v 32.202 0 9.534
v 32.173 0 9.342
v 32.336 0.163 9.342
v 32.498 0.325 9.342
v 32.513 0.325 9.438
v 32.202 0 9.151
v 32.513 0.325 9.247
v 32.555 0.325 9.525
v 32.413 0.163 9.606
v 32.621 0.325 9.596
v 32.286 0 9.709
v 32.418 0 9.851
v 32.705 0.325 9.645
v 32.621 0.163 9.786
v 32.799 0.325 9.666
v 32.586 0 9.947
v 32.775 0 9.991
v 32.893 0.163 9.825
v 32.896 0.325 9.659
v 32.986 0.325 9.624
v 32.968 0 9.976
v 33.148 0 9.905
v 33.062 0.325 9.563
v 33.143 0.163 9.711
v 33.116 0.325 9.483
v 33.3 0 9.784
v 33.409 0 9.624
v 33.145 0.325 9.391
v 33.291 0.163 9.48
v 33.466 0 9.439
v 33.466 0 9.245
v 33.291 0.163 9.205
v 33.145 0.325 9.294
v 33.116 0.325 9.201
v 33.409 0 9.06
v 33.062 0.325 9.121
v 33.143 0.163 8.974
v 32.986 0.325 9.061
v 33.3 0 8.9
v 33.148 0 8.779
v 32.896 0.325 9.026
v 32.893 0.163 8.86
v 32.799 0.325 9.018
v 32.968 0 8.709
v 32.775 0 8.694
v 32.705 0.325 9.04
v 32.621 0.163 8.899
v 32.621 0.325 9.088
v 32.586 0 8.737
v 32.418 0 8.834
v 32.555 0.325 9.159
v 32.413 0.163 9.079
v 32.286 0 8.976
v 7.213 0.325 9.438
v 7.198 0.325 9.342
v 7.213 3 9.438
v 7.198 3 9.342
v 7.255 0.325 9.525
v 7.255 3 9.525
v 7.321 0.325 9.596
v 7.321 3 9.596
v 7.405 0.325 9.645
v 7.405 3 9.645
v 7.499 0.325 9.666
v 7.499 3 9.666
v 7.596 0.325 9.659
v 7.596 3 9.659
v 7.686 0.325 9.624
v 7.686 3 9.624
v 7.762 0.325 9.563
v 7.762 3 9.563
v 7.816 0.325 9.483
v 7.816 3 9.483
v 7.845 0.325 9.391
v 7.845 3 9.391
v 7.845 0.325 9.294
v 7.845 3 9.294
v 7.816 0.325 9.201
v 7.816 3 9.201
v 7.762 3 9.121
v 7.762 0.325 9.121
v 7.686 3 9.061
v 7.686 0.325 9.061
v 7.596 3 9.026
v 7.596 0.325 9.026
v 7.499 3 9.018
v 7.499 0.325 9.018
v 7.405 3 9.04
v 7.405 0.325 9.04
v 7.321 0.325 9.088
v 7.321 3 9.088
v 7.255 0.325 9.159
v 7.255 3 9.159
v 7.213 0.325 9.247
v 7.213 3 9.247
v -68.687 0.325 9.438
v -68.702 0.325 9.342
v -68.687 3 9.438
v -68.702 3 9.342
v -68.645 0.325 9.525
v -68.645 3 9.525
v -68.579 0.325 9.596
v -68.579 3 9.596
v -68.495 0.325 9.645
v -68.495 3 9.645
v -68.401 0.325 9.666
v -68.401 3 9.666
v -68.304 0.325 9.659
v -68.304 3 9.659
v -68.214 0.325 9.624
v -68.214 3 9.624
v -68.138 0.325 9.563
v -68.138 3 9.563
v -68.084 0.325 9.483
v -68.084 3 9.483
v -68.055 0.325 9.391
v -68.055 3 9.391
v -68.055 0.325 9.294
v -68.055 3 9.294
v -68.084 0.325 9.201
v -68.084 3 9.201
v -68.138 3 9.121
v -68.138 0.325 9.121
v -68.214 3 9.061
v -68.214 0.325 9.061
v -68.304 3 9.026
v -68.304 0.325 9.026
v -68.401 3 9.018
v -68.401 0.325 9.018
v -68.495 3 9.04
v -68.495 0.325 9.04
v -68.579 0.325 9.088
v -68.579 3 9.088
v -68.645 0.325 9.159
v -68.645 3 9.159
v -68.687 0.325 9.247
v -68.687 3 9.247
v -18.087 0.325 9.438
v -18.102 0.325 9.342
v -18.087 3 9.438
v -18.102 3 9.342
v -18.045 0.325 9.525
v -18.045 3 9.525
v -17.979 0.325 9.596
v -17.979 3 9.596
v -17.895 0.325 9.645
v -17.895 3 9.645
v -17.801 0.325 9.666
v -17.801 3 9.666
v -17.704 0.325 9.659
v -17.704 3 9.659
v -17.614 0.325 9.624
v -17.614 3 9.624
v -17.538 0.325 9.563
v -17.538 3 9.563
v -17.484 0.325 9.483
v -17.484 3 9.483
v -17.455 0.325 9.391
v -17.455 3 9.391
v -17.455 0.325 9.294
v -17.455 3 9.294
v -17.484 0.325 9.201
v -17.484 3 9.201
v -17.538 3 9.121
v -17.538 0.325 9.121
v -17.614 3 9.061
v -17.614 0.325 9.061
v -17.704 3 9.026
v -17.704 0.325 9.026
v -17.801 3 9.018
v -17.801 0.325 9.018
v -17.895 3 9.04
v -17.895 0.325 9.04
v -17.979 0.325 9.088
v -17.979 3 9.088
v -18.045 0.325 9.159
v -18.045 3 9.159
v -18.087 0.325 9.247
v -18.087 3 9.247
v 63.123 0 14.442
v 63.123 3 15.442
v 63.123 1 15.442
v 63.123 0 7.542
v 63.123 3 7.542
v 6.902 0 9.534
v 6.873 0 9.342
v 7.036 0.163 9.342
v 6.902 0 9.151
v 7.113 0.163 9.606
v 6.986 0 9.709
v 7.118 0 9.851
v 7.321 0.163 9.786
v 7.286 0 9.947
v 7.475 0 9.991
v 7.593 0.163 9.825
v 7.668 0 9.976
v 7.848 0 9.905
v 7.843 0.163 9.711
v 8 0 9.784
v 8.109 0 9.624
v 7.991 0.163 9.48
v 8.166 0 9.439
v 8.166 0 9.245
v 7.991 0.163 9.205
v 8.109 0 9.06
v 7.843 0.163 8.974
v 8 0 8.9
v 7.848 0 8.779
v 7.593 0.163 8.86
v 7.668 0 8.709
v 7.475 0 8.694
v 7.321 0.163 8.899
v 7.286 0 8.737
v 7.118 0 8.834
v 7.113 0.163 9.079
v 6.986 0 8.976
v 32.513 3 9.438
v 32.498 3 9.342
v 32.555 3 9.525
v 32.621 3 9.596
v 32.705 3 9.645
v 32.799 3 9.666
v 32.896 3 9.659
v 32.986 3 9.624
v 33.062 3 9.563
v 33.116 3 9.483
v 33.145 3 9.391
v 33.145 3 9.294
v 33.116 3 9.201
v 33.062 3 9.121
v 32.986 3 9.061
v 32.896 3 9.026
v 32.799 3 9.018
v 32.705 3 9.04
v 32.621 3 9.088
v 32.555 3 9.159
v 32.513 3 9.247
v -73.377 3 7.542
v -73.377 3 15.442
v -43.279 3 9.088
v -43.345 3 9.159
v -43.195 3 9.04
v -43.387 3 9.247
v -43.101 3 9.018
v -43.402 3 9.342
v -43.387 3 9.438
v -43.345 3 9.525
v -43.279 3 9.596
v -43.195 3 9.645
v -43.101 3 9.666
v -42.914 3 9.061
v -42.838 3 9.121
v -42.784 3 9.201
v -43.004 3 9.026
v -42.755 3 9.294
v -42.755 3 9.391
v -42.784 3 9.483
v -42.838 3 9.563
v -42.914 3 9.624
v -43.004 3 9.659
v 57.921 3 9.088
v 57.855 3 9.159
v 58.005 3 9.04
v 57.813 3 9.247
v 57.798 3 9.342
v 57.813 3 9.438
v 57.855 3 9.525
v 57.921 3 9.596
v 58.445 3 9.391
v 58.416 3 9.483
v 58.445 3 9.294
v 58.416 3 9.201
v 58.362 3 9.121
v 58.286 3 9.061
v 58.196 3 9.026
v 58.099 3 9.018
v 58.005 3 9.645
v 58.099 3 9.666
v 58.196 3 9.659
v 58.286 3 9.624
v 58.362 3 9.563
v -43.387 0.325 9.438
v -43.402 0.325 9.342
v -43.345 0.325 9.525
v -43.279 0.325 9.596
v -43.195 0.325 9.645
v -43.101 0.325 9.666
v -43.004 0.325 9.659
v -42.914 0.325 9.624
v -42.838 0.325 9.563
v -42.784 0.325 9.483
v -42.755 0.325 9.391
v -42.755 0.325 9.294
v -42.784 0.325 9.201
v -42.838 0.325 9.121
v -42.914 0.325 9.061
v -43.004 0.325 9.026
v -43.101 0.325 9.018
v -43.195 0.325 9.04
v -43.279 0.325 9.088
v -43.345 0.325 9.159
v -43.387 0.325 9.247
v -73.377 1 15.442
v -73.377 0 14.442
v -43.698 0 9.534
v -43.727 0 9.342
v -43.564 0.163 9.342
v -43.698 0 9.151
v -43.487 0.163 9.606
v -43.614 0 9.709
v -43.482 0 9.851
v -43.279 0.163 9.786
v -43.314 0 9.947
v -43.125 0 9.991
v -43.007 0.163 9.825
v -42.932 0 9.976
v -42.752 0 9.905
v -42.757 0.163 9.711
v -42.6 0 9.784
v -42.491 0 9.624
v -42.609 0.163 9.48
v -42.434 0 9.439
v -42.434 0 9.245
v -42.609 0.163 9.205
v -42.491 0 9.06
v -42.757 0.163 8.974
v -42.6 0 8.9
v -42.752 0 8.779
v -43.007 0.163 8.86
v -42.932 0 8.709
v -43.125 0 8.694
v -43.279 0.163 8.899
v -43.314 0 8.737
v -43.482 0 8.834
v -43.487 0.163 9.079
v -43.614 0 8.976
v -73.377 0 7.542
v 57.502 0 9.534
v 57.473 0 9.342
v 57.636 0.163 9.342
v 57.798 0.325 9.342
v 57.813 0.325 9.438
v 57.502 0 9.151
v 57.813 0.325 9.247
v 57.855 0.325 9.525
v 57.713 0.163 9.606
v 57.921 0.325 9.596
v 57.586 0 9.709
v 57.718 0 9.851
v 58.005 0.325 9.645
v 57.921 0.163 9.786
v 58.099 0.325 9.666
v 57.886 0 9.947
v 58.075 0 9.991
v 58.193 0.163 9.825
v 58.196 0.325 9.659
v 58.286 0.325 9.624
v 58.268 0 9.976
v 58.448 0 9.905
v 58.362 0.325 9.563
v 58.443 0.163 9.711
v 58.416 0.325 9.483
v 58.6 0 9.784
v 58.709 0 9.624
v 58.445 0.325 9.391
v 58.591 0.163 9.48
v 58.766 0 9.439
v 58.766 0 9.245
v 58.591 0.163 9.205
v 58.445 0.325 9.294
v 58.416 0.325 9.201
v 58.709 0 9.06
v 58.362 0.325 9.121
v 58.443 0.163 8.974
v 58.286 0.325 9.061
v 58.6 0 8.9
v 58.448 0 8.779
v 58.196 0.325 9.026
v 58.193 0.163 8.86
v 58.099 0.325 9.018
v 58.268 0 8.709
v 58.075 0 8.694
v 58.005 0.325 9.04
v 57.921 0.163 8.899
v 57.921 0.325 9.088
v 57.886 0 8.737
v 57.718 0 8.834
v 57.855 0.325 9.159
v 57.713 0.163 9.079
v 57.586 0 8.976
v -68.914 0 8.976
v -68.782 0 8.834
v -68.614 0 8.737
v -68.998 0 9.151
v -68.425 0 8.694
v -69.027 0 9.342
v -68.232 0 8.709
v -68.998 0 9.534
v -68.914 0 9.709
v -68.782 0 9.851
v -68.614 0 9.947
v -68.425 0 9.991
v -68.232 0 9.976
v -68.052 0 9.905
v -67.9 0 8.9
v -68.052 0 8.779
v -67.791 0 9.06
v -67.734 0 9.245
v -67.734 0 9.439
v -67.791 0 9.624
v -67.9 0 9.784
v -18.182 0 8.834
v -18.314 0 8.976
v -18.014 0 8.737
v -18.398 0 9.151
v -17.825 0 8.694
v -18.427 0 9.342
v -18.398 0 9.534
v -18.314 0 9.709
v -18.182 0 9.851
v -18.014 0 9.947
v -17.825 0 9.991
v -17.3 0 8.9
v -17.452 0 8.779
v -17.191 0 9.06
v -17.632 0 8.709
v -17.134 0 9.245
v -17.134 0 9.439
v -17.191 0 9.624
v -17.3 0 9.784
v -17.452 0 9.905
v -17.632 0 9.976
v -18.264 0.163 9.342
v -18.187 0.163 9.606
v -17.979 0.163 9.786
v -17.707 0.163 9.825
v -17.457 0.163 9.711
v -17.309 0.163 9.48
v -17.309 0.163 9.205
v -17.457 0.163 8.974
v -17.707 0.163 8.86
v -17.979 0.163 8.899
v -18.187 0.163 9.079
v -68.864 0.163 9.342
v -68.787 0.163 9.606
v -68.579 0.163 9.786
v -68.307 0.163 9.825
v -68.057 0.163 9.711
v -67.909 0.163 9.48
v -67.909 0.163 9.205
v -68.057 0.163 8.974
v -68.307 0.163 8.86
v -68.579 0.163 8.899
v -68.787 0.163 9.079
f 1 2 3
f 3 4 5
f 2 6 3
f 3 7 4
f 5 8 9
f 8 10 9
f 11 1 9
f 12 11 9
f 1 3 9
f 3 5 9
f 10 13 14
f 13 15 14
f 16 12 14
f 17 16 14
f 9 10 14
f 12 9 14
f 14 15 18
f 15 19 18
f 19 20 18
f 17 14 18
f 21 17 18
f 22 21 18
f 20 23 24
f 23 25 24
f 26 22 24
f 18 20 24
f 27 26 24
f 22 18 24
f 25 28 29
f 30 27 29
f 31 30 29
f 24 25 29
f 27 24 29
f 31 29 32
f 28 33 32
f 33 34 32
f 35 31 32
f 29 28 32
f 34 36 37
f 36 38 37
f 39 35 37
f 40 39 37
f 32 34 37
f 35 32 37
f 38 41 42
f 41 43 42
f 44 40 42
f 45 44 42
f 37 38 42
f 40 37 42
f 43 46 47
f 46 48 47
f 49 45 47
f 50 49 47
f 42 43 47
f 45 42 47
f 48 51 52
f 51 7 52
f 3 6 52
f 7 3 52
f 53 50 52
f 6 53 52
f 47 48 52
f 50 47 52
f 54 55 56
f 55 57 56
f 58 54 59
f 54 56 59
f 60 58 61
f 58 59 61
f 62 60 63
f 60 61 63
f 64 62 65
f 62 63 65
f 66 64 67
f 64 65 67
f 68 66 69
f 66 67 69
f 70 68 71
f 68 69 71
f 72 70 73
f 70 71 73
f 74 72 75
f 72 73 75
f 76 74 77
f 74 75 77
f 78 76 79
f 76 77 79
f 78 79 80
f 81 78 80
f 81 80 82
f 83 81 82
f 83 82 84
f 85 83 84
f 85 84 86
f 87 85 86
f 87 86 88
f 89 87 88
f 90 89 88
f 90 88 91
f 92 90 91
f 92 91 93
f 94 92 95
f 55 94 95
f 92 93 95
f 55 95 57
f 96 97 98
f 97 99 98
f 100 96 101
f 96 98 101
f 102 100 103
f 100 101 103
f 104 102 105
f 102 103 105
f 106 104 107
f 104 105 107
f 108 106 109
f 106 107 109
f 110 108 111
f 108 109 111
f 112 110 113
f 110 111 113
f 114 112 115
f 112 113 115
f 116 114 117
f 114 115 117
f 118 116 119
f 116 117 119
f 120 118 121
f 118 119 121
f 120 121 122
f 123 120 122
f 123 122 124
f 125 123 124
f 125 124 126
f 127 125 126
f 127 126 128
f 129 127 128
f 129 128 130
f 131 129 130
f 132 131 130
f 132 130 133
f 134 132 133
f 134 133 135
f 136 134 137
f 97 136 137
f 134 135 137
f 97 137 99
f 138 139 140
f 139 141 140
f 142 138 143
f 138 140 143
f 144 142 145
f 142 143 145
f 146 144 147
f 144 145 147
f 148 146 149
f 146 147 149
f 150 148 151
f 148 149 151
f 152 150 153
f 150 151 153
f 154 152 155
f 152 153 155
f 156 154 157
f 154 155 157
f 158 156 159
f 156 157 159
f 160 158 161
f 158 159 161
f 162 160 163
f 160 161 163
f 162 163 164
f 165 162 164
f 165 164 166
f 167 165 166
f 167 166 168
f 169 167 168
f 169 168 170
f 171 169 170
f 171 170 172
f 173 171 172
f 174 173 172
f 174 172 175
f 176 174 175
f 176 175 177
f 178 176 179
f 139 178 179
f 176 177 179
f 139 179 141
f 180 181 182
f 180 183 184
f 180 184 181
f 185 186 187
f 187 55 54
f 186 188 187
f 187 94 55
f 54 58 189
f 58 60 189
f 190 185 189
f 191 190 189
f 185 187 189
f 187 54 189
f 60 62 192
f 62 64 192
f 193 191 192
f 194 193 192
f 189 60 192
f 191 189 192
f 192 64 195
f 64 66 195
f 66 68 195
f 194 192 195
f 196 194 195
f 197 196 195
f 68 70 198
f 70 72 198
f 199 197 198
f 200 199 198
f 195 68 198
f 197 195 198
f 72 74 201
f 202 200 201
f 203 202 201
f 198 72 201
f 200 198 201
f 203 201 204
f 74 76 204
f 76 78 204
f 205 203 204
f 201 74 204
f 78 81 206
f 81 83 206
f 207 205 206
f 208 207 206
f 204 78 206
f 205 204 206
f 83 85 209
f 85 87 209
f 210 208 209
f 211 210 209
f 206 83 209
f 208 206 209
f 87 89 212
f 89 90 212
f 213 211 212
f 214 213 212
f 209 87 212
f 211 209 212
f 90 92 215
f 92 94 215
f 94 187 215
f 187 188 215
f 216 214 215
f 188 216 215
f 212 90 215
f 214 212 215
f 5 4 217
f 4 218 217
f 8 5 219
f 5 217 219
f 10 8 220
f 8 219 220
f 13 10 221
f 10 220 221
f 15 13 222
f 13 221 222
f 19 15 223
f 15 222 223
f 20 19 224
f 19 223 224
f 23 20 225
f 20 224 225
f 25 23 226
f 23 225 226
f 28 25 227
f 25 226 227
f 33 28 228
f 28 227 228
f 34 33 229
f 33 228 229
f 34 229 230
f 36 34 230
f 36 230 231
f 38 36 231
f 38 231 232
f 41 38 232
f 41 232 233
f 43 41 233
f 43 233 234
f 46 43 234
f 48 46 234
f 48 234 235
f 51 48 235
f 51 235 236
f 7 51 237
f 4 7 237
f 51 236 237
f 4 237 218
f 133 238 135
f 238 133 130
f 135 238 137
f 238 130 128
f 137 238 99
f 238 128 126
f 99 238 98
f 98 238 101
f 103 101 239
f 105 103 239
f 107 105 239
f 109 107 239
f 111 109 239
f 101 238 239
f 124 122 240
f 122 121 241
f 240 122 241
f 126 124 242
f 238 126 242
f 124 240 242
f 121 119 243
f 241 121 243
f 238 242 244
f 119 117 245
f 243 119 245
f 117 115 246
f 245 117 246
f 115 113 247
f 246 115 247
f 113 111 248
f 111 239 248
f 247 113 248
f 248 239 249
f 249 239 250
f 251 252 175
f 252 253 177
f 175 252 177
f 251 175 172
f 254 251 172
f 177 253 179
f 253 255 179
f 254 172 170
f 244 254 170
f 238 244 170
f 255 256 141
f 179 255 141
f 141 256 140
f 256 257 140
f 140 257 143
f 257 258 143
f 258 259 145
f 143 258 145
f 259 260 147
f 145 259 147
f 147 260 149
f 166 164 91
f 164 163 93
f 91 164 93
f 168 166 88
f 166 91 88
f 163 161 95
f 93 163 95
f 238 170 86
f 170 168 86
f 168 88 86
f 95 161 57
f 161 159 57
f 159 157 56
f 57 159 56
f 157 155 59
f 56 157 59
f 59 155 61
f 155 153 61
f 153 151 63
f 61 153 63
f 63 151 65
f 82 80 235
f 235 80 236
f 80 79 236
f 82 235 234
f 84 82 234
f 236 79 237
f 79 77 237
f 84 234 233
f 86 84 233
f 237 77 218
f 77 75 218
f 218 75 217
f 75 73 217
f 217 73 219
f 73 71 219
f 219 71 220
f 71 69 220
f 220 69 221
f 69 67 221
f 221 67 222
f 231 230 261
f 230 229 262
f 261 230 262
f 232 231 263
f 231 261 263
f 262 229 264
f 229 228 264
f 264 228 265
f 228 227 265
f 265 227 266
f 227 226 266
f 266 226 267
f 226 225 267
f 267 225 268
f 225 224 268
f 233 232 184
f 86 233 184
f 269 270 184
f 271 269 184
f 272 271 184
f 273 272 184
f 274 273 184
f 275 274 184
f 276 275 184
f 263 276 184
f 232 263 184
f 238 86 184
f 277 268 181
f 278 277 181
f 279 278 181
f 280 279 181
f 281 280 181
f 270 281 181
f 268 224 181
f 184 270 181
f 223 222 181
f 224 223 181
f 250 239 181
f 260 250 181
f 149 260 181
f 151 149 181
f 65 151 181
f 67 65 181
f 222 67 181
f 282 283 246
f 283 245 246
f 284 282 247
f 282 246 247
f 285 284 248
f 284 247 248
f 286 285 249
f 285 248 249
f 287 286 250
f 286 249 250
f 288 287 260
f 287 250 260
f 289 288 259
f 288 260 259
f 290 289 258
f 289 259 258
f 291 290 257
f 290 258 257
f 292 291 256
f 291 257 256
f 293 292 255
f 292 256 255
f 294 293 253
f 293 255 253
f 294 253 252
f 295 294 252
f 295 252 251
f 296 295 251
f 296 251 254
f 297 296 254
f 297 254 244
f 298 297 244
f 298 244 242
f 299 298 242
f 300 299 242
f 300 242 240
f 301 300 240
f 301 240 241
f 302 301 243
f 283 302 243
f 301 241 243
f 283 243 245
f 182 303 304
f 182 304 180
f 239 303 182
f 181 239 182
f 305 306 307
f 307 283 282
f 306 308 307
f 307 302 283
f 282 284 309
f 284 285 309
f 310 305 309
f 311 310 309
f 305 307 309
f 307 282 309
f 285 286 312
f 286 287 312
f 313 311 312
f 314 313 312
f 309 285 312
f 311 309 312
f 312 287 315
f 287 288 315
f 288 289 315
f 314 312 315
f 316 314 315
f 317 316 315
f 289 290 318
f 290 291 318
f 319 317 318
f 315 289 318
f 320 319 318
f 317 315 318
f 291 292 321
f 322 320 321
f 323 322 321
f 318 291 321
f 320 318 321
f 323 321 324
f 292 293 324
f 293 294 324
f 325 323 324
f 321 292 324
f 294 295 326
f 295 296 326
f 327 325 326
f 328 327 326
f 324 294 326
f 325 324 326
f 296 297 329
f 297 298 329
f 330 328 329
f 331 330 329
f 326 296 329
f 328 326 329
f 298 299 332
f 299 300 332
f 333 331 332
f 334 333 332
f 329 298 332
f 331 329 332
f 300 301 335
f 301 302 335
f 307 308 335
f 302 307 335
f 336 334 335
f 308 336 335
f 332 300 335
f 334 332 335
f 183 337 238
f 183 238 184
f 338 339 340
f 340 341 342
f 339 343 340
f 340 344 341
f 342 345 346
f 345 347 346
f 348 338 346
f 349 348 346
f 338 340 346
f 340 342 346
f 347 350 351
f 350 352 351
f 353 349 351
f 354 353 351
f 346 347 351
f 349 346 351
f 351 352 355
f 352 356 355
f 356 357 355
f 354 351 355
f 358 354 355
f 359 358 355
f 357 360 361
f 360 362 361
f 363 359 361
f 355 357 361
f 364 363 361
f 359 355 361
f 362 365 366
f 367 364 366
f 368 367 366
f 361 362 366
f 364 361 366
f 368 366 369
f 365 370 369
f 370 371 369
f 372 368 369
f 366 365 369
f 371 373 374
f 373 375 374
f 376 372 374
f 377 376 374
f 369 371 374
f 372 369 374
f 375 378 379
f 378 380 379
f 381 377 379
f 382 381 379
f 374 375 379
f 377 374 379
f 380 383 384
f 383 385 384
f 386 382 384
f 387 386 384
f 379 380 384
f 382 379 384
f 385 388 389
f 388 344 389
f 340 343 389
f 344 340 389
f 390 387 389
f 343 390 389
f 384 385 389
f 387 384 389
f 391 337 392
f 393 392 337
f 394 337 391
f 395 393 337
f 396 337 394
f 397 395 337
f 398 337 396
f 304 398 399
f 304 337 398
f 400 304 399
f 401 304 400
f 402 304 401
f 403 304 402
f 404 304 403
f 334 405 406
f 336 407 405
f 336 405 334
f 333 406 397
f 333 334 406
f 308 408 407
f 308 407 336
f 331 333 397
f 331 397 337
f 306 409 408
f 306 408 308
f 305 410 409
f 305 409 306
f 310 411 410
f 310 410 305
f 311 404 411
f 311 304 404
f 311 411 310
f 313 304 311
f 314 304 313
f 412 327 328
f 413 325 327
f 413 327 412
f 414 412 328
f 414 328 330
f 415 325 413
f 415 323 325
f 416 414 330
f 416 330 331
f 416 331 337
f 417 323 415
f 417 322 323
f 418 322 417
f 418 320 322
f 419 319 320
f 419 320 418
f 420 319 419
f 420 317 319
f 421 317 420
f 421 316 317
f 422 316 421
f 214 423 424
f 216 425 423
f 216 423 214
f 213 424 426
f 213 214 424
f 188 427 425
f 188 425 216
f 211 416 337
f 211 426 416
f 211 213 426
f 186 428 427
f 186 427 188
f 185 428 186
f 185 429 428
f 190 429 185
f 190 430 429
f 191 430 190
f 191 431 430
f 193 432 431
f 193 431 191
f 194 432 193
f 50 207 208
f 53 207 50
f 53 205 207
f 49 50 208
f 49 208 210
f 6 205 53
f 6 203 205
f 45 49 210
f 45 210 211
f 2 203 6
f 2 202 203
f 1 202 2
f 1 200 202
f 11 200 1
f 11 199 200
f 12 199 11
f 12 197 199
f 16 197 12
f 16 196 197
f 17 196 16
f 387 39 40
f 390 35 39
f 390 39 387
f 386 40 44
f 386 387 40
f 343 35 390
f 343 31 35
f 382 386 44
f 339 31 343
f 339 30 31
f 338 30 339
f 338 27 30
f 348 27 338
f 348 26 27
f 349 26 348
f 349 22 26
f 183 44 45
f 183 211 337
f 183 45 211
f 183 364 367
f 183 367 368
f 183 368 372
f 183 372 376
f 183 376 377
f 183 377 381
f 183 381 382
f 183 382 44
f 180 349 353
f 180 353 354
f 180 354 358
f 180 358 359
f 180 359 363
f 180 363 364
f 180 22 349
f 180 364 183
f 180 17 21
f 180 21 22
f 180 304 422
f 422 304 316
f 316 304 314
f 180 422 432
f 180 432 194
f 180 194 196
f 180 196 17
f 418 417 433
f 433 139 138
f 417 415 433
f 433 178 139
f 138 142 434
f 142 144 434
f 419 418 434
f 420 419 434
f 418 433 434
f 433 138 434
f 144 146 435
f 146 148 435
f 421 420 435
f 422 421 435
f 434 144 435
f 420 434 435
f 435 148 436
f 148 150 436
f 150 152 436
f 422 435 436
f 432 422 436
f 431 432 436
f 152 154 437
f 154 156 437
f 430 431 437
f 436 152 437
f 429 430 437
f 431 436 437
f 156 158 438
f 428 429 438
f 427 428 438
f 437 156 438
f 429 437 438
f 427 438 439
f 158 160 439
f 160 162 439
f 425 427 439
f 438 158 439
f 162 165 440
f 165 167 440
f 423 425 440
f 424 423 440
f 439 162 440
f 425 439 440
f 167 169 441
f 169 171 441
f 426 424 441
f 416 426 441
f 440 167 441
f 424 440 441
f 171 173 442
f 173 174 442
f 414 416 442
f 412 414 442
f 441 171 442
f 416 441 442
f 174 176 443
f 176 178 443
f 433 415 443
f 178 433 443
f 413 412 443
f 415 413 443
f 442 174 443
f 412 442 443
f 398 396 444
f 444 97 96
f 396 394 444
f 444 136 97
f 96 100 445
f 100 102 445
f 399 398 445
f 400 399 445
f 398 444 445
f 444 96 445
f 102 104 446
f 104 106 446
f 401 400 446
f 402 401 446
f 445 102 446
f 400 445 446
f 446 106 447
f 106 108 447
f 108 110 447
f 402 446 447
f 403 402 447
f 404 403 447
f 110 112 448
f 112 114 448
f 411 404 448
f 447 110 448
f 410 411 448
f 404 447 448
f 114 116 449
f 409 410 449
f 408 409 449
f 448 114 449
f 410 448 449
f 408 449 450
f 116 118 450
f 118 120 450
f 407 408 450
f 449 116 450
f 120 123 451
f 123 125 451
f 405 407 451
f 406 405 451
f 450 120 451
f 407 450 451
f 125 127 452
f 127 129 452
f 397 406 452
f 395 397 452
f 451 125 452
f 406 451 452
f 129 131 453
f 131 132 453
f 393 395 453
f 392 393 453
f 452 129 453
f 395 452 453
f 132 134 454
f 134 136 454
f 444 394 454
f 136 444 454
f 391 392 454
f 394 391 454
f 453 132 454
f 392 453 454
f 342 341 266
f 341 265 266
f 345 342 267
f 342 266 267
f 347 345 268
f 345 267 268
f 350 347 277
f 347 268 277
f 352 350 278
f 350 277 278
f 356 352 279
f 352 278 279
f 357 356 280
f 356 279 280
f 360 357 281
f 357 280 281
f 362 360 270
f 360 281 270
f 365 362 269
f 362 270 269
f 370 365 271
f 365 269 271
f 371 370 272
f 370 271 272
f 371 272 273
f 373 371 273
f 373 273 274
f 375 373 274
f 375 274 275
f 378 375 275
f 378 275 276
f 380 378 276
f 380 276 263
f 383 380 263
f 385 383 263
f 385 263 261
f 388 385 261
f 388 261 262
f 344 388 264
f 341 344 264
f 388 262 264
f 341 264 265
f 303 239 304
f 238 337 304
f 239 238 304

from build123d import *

# Parameters (mm, degrees)
F0_W           = 136.5
F0_H           = 7.9
F1_DEPTH       = 3
F2_D           = 0.65
F2_CSINK_D     = 1.3
F2_CSINK_ANGLE = 90
F3_SIZE        = 1


with BuildPart() as f1:
    # F0 (on Front) → F1 (new body)
    with BuildSketch(Plane.XZ):
        with Locations((-5.126582, 11.492361)):
            Rectangle(F0_W, F0_H)
    extrude(amount=-F1_DEPTH)

    # F2 (through all)
    with Locations(Plane.XZ):
        with Locations((58.123418, 9.342361), (32.823418, 9.342361), (7.523418, 9.342361), (-17.776582, 9.342361), (-43.076582, 9.342361), (-68.376582, 9.342361)):
            CounterSinkHole(F2_D / 2, F2_CSINK_D / 2, counter_sink_angle=F2_CSINK_ANGLE)

    # F3
    f3_edges = [f1.edges().sort_by_distance(p)[0] for p in [
        (-5.126582, 0, 15.442361),
    ]]
    chamfer(f3_edges, length=F3_SIZE)


solid = f1.part
